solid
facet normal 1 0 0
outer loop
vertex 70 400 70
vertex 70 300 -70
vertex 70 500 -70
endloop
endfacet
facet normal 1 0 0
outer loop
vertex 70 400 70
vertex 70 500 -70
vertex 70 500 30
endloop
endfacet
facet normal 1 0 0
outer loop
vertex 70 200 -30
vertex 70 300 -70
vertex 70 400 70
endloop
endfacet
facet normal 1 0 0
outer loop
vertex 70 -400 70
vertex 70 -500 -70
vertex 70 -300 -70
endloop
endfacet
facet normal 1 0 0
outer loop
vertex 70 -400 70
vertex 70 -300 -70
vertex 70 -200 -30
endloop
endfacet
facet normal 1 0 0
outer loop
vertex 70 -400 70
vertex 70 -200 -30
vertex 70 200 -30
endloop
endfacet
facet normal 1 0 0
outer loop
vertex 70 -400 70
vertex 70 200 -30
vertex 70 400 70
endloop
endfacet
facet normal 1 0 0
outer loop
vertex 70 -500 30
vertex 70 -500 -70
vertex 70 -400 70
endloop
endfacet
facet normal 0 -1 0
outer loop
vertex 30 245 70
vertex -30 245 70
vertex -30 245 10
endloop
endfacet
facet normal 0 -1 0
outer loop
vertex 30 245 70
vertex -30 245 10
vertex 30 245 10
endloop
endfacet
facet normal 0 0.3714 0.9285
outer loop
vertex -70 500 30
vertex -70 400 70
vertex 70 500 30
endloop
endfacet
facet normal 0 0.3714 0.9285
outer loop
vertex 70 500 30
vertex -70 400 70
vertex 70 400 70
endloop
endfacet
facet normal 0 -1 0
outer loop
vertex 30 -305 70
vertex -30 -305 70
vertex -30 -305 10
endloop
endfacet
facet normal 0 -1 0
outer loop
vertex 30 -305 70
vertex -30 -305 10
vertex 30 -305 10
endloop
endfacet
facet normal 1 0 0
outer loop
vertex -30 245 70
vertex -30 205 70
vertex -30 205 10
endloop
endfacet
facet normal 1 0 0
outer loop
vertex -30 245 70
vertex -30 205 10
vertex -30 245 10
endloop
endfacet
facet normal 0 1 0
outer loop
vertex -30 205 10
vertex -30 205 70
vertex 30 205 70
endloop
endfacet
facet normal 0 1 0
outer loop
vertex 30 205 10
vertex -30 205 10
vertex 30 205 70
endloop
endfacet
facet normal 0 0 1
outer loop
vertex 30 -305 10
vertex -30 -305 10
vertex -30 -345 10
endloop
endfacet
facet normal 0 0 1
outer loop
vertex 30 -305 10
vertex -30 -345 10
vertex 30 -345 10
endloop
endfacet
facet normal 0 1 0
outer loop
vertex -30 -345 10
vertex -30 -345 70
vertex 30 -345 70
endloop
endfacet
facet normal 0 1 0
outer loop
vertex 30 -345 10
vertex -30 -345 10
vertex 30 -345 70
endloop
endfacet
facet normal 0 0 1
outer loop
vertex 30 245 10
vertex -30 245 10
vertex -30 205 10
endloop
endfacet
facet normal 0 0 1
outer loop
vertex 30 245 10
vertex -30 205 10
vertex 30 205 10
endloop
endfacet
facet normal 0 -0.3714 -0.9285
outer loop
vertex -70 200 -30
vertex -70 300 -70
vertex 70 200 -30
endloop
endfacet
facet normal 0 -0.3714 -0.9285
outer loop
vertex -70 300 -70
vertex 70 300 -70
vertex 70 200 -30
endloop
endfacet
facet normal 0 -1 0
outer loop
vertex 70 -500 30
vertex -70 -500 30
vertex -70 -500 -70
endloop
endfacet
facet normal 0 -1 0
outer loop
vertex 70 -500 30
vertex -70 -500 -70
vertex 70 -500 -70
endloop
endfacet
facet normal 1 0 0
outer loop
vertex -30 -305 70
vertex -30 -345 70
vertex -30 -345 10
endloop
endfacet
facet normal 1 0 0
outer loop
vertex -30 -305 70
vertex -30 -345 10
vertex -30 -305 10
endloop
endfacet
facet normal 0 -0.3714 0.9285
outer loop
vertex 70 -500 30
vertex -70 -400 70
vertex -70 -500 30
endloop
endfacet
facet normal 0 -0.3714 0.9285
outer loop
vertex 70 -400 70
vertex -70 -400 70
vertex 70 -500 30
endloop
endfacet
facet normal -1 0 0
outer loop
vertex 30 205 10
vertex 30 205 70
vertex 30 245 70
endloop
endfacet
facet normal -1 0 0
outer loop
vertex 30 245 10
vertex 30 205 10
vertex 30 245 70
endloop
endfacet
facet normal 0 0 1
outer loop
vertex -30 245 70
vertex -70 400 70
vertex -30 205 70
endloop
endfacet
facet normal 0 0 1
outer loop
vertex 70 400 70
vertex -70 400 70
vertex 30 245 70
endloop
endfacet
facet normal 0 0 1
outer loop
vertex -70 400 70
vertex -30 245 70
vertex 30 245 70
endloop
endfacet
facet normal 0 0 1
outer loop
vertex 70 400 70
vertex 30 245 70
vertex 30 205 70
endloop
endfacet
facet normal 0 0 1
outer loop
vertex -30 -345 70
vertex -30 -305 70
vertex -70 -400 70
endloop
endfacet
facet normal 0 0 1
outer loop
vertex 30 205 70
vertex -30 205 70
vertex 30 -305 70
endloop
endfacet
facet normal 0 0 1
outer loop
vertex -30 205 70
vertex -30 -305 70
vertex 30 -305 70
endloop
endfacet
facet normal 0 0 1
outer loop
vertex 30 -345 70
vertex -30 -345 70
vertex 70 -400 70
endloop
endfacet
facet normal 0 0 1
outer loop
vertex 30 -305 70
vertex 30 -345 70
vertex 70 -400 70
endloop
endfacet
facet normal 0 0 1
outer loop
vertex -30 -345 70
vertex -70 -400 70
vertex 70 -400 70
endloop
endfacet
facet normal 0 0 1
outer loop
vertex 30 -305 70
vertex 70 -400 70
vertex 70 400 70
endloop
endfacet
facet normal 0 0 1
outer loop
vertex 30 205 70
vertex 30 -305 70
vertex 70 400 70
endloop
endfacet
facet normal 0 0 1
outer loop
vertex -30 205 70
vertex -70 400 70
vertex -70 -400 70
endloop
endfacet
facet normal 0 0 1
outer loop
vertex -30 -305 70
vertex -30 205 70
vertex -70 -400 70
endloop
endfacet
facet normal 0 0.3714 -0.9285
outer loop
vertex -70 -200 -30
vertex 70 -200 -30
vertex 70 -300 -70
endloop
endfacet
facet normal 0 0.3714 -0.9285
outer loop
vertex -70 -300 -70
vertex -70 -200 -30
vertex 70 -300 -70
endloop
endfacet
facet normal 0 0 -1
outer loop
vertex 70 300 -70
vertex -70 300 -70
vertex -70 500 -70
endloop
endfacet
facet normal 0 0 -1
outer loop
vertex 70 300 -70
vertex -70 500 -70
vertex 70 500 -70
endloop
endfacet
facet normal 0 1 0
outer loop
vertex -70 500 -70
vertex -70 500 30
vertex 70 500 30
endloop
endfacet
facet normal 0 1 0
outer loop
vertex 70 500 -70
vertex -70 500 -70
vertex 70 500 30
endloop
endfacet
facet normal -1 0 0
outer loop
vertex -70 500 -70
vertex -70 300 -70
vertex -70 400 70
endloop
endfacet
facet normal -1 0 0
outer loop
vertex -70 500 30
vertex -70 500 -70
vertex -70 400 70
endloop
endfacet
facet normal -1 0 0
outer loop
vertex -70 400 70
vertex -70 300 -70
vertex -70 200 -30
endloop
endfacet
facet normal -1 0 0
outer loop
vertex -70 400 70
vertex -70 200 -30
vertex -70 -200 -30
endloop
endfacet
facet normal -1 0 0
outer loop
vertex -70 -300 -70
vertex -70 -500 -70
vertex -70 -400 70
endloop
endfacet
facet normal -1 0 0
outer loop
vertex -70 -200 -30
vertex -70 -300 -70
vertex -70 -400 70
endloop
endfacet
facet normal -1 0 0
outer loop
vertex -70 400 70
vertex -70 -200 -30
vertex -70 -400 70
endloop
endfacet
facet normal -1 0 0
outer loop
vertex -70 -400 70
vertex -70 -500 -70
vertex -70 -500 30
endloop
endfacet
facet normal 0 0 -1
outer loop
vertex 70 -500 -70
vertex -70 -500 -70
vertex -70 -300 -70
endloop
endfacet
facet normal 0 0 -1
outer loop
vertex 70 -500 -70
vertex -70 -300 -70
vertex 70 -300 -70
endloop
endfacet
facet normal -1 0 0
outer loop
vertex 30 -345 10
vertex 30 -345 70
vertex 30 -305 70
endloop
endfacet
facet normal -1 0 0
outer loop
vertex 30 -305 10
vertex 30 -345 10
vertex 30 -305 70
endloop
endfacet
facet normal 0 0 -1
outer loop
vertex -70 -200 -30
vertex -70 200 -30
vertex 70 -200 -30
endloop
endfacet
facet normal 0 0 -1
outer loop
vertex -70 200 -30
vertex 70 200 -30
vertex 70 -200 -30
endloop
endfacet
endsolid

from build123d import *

# Parameters (mm, degrees)
F2_W       = 140
F2_H       = 140
F3_DEPTH   = 500
F4_SIZE2   = 100
F4_SIZE    = 40
F4_2_SIZE2 = 100
F4_2_SIZE  = 40
F6_DEPTH   = 70
F7_W       = 60
F7_H       = 40
F8_DEPTH   = 60


with BuildPart() as f3:
    # F2 (on Front) → F3 (new body, symmetric)
    with BuildSketch(Plane.XZ):
        Rectangle(F2_W, F2_H)
    extrude(amount=F3_DEPTH, both=True)

    # F4
    f4_edges = [f3.edges().sort_by_distance(p)[0] for p in [
        (0, -500, 70),
    ]]
    f4_side = f3.faces().sort_by_distance((0, -500, 0))[0]
    chamfer(f4_edges, length=F4_SIZE, length2=F4_SIZE2, reference=f4_side)

    # F4#2
    f4_2_edges = [f3.edges().sort_by_distance(p)[0] for p in [
        (0, 500, 70),
    ]]
    f4_2_side = f3.faces().sort_by_distance((0, 500, 0))[0]
    chamfer(f4_2_edges, length=F4_2_SIZE, length2=F4_2_SIZE2, reference=f4_2_side)

    # F5 (on Right) → F6 (cut, symmetric)
    with BuildSketch(Plane.YZ):
        Polygon((200, -30), (0, -30), (-200, -30), (-300, -70), (0, -70), (300, -70), align=None)
    extrude(amount=F6_DEPTH, both=True, mode=Mode.SUBTRACT)

    # F7 (on face) → F8 (cut)
    with BuildSketch(Plane.XY.offset(70)):
        with Locations((0, -325)):
            Rectangle(F7_W, F7_H)
        with Locations((0, 225)):
            Rectangle(F7_W, F7_H)
    extrude(amount=-F8_DEPTH, mode=Mode.SUBTRACT)


solid = f3.part
